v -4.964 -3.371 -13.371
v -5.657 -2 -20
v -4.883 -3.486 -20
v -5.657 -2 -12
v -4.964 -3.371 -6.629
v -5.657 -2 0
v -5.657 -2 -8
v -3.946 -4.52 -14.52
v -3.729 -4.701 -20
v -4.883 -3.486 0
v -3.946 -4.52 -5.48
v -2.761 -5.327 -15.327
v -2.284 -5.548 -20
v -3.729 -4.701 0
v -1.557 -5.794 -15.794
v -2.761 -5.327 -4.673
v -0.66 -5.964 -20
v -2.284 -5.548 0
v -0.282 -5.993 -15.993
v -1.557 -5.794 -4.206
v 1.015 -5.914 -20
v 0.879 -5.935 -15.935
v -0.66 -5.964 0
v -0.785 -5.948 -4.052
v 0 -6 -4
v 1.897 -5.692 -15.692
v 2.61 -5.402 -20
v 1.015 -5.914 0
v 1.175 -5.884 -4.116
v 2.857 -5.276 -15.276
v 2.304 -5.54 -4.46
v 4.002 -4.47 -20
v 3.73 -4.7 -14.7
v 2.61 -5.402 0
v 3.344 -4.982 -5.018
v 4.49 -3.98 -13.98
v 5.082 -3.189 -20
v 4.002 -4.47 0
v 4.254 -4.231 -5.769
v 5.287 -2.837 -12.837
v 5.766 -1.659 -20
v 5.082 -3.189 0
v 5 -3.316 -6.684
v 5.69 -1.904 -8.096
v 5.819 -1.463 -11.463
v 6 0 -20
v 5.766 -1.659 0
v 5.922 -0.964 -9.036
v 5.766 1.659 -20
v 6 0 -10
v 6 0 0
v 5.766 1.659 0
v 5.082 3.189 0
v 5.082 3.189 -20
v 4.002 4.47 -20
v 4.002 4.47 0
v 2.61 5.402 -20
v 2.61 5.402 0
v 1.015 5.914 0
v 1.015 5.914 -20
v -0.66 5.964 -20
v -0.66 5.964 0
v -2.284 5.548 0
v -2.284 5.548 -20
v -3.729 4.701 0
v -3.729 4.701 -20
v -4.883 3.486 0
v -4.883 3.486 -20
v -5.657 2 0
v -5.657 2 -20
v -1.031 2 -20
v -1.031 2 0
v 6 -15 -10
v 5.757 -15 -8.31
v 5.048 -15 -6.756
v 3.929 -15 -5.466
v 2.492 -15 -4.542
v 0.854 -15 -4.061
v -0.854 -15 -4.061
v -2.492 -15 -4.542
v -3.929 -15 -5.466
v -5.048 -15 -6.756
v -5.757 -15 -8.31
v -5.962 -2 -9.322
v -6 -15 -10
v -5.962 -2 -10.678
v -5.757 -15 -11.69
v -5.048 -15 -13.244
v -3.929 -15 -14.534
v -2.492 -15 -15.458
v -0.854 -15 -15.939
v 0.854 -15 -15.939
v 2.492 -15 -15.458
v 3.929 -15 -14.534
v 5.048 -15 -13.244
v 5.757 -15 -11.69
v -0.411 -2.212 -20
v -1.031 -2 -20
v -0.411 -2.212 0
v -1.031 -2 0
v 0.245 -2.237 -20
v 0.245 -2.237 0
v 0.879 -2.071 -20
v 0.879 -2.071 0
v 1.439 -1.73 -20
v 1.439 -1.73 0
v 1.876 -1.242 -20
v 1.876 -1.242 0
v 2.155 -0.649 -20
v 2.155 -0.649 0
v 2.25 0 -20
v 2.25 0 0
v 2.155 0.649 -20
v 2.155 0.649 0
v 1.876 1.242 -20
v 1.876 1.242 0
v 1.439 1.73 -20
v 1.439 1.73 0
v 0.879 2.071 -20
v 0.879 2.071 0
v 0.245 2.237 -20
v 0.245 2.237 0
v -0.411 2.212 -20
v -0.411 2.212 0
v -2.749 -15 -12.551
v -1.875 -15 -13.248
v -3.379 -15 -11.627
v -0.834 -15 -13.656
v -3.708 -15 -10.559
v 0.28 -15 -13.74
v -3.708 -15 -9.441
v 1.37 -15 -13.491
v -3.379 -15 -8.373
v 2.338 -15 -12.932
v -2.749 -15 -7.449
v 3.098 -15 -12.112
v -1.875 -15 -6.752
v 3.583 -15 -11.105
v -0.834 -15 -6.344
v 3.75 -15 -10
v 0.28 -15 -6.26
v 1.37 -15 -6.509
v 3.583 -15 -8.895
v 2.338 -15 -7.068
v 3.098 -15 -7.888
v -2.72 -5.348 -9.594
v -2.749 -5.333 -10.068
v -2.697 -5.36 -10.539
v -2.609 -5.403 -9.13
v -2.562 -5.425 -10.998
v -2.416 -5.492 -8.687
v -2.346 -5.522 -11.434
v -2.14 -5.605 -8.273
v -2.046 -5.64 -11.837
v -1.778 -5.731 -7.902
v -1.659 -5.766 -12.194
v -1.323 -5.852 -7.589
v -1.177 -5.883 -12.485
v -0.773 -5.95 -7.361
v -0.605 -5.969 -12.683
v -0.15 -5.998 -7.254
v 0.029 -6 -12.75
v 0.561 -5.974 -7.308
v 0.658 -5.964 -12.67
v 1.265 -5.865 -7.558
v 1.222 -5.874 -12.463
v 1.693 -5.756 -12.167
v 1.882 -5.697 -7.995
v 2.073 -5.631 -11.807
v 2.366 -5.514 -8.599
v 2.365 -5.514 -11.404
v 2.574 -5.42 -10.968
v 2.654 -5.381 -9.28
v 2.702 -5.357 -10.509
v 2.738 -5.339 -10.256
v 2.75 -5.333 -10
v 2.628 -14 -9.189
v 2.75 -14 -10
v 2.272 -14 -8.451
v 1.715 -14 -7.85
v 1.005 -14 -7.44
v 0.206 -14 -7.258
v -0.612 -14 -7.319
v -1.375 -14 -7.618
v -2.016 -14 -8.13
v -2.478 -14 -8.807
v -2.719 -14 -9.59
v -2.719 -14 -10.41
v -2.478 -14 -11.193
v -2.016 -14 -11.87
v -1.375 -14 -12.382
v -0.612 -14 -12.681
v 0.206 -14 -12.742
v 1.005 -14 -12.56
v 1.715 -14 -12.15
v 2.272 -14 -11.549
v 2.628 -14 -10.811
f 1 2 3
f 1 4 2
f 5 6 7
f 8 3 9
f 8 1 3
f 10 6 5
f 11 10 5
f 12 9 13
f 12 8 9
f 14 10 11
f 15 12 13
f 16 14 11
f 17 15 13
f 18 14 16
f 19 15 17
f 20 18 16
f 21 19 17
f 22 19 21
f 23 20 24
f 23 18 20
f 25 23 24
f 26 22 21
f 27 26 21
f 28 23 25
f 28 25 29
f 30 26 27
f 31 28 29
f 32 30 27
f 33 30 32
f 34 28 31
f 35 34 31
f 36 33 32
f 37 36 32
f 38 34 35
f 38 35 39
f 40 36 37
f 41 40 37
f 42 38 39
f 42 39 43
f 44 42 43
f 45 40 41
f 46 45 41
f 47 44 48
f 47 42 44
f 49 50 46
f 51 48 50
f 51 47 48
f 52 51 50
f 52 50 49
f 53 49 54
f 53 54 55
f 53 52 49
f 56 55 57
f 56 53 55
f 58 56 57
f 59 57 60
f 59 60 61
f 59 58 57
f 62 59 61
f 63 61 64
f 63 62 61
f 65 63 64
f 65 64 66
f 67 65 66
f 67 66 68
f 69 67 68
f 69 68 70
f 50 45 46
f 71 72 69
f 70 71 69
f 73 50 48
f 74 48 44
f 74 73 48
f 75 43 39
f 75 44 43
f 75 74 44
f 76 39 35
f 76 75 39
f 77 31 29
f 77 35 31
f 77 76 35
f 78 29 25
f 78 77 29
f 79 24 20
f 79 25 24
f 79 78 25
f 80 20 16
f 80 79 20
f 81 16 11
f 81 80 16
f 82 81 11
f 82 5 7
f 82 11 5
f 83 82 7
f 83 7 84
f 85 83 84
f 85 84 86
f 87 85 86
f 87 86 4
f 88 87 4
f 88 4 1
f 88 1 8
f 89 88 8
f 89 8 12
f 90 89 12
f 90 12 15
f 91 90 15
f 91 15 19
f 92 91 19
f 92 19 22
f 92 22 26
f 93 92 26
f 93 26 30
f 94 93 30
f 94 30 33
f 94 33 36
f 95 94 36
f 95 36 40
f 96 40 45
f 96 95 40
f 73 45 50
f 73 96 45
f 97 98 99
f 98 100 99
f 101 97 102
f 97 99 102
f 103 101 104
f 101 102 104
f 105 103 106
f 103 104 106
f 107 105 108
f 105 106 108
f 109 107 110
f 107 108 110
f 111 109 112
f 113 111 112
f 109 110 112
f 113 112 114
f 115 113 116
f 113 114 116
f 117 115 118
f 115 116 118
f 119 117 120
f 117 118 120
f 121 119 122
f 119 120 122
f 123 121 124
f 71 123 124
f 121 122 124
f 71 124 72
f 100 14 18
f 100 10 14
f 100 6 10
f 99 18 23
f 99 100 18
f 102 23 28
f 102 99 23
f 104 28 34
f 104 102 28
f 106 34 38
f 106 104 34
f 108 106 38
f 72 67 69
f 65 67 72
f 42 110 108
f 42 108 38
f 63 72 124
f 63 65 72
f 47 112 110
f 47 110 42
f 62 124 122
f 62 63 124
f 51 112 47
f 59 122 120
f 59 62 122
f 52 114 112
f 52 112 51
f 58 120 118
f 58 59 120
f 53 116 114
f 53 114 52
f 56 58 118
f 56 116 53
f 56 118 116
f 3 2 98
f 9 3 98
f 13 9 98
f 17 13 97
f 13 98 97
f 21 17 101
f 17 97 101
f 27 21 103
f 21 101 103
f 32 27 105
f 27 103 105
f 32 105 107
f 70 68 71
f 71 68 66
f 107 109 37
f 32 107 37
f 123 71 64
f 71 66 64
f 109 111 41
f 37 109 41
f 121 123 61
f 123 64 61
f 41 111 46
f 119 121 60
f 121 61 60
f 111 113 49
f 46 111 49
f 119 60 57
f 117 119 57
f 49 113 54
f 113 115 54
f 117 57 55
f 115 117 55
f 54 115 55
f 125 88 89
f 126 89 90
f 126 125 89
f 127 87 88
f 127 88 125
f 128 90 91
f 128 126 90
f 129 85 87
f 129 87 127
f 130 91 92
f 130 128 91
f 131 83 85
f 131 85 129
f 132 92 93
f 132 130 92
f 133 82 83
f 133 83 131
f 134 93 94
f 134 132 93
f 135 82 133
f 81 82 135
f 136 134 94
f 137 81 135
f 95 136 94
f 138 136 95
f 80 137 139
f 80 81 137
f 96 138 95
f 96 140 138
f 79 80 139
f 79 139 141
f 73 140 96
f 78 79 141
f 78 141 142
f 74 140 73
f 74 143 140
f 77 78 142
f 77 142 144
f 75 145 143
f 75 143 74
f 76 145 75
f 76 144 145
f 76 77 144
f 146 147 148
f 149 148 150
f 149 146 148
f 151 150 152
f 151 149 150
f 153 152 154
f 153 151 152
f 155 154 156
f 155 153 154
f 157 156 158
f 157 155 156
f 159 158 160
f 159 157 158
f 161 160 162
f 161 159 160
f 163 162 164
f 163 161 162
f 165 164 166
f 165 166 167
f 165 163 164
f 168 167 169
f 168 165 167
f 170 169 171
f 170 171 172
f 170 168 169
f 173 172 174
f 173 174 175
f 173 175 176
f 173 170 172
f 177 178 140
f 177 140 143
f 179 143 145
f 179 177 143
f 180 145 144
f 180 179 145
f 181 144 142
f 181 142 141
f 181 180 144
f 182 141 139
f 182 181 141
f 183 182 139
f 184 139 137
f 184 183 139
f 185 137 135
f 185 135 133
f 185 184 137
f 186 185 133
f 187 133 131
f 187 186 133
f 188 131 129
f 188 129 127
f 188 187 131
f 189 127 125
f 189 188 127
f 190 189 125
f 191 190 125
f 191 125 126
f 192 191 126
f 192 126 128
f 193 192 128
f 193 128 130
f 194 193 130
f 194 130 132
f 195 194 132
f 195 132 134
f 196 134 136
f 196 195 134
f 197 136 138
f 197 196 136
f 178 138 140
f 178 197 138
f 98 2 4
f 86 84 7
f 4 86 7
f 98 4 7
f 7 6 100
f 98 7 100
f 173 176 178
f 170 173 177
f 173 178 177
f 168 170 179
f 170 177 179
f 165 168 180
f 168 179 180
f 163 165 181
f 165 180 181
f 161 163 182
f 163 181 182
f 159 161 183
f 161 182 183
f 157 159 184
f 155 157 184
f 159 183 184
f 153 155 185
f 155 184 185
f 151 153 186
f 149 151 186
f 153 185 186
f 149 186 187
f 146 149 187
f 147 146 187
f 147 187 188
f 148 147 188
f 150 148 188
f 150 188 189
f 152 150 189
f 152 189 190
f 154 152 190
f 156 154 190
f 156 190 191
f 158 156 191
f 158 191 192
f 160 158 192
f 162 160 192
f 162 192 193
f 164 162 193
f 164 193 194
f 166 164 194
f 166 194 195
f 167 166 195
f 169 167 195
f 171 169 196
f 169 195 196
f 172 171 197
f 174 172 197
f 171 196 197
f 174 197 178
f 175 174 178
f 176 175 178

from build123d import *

# Parameters (mm, degrees)
F0_R     = 6
F1_DEPTH = 20
F4_R     = 6
F4_R_2   = 2.75
F5_DEPTH = 15
F2_R     = 2.25
F6_DEPTH = 20
F8_DEPTH = 20
F9_SIZE  = 1


with BuildPart() as f1:
    # F0 (on Top) → F1 (new body)
    with BuildSketch(Plane.XY):
        Circle(F0_R)
    extrude(amount=-F1_DEPTH)

    # F4 (on offset) → F5 (join)
    with BuildSketch(Plane.XZ.offset(15)):
        with Locations((0, -10)):
            Circle(F4_R)
        with Locations((0, -10)):
            Circle(F4_R_2, mode=Mode.SUBTRACT)
    extrude(amount=-F5_DEPTH)

    # F2 (on face) → F6 (cut, through all)
    with BuildSketch(Plane.XY):
        Circle(F2_R)
    extrude(amount=-F6_DEPTH, mode=Mode.SUBTRACT)

    # F7 (on face) → F8 (cut, through all)
    with BuildSketch(Plane.XY):
        with BuildLine():
            Line((-1.0307764064, 2), (-5.6568542495, 2))
            ThreePointArc((-5.6568542495, 2), (-6, 0), (-5.6568542495, -2))
            Line((-5.6568542495, -2), (-1.0307764064, -2))
            ThreePointArc((-1.0307764064, -2), (-2.25, 0), (-1.0307764064, 2))
        make_face()
        with BuildLine():
            Line((0, 2), (-1.0307764064, 2))
            ThreePointArc((-1.0307764064, 2), (-2.25, 0), (-1.0307764064, -2))
            Line((-1.0307764064, -2), (0, -2))
            Line((0, -2), (0, 2))
        make_face()
        with BuildLine():
            Line((-5.6568542495, 2), (-8.5344118631, 2))
            Line((-8.5344118631, 2), (-8.5344118631, -2))
            Line((-8.5344118631, -2), (-5.6568542495, -2))
            ThreePointArc((-5.6568542495, -2), (-6, 0), (-5.6568542495, 2))
        make_face()
    extrude(amount=-F8_DEPTH, mode=Mode.SUBTRACT)

    # F9
    f9_edges = [f1.edges().sort_by_distance(p)[0] for p in [
        (-2.75, -15, -10),
    ]]
    chamfer(f9_edges, length=F9_SIZE)


solid = f1.part
